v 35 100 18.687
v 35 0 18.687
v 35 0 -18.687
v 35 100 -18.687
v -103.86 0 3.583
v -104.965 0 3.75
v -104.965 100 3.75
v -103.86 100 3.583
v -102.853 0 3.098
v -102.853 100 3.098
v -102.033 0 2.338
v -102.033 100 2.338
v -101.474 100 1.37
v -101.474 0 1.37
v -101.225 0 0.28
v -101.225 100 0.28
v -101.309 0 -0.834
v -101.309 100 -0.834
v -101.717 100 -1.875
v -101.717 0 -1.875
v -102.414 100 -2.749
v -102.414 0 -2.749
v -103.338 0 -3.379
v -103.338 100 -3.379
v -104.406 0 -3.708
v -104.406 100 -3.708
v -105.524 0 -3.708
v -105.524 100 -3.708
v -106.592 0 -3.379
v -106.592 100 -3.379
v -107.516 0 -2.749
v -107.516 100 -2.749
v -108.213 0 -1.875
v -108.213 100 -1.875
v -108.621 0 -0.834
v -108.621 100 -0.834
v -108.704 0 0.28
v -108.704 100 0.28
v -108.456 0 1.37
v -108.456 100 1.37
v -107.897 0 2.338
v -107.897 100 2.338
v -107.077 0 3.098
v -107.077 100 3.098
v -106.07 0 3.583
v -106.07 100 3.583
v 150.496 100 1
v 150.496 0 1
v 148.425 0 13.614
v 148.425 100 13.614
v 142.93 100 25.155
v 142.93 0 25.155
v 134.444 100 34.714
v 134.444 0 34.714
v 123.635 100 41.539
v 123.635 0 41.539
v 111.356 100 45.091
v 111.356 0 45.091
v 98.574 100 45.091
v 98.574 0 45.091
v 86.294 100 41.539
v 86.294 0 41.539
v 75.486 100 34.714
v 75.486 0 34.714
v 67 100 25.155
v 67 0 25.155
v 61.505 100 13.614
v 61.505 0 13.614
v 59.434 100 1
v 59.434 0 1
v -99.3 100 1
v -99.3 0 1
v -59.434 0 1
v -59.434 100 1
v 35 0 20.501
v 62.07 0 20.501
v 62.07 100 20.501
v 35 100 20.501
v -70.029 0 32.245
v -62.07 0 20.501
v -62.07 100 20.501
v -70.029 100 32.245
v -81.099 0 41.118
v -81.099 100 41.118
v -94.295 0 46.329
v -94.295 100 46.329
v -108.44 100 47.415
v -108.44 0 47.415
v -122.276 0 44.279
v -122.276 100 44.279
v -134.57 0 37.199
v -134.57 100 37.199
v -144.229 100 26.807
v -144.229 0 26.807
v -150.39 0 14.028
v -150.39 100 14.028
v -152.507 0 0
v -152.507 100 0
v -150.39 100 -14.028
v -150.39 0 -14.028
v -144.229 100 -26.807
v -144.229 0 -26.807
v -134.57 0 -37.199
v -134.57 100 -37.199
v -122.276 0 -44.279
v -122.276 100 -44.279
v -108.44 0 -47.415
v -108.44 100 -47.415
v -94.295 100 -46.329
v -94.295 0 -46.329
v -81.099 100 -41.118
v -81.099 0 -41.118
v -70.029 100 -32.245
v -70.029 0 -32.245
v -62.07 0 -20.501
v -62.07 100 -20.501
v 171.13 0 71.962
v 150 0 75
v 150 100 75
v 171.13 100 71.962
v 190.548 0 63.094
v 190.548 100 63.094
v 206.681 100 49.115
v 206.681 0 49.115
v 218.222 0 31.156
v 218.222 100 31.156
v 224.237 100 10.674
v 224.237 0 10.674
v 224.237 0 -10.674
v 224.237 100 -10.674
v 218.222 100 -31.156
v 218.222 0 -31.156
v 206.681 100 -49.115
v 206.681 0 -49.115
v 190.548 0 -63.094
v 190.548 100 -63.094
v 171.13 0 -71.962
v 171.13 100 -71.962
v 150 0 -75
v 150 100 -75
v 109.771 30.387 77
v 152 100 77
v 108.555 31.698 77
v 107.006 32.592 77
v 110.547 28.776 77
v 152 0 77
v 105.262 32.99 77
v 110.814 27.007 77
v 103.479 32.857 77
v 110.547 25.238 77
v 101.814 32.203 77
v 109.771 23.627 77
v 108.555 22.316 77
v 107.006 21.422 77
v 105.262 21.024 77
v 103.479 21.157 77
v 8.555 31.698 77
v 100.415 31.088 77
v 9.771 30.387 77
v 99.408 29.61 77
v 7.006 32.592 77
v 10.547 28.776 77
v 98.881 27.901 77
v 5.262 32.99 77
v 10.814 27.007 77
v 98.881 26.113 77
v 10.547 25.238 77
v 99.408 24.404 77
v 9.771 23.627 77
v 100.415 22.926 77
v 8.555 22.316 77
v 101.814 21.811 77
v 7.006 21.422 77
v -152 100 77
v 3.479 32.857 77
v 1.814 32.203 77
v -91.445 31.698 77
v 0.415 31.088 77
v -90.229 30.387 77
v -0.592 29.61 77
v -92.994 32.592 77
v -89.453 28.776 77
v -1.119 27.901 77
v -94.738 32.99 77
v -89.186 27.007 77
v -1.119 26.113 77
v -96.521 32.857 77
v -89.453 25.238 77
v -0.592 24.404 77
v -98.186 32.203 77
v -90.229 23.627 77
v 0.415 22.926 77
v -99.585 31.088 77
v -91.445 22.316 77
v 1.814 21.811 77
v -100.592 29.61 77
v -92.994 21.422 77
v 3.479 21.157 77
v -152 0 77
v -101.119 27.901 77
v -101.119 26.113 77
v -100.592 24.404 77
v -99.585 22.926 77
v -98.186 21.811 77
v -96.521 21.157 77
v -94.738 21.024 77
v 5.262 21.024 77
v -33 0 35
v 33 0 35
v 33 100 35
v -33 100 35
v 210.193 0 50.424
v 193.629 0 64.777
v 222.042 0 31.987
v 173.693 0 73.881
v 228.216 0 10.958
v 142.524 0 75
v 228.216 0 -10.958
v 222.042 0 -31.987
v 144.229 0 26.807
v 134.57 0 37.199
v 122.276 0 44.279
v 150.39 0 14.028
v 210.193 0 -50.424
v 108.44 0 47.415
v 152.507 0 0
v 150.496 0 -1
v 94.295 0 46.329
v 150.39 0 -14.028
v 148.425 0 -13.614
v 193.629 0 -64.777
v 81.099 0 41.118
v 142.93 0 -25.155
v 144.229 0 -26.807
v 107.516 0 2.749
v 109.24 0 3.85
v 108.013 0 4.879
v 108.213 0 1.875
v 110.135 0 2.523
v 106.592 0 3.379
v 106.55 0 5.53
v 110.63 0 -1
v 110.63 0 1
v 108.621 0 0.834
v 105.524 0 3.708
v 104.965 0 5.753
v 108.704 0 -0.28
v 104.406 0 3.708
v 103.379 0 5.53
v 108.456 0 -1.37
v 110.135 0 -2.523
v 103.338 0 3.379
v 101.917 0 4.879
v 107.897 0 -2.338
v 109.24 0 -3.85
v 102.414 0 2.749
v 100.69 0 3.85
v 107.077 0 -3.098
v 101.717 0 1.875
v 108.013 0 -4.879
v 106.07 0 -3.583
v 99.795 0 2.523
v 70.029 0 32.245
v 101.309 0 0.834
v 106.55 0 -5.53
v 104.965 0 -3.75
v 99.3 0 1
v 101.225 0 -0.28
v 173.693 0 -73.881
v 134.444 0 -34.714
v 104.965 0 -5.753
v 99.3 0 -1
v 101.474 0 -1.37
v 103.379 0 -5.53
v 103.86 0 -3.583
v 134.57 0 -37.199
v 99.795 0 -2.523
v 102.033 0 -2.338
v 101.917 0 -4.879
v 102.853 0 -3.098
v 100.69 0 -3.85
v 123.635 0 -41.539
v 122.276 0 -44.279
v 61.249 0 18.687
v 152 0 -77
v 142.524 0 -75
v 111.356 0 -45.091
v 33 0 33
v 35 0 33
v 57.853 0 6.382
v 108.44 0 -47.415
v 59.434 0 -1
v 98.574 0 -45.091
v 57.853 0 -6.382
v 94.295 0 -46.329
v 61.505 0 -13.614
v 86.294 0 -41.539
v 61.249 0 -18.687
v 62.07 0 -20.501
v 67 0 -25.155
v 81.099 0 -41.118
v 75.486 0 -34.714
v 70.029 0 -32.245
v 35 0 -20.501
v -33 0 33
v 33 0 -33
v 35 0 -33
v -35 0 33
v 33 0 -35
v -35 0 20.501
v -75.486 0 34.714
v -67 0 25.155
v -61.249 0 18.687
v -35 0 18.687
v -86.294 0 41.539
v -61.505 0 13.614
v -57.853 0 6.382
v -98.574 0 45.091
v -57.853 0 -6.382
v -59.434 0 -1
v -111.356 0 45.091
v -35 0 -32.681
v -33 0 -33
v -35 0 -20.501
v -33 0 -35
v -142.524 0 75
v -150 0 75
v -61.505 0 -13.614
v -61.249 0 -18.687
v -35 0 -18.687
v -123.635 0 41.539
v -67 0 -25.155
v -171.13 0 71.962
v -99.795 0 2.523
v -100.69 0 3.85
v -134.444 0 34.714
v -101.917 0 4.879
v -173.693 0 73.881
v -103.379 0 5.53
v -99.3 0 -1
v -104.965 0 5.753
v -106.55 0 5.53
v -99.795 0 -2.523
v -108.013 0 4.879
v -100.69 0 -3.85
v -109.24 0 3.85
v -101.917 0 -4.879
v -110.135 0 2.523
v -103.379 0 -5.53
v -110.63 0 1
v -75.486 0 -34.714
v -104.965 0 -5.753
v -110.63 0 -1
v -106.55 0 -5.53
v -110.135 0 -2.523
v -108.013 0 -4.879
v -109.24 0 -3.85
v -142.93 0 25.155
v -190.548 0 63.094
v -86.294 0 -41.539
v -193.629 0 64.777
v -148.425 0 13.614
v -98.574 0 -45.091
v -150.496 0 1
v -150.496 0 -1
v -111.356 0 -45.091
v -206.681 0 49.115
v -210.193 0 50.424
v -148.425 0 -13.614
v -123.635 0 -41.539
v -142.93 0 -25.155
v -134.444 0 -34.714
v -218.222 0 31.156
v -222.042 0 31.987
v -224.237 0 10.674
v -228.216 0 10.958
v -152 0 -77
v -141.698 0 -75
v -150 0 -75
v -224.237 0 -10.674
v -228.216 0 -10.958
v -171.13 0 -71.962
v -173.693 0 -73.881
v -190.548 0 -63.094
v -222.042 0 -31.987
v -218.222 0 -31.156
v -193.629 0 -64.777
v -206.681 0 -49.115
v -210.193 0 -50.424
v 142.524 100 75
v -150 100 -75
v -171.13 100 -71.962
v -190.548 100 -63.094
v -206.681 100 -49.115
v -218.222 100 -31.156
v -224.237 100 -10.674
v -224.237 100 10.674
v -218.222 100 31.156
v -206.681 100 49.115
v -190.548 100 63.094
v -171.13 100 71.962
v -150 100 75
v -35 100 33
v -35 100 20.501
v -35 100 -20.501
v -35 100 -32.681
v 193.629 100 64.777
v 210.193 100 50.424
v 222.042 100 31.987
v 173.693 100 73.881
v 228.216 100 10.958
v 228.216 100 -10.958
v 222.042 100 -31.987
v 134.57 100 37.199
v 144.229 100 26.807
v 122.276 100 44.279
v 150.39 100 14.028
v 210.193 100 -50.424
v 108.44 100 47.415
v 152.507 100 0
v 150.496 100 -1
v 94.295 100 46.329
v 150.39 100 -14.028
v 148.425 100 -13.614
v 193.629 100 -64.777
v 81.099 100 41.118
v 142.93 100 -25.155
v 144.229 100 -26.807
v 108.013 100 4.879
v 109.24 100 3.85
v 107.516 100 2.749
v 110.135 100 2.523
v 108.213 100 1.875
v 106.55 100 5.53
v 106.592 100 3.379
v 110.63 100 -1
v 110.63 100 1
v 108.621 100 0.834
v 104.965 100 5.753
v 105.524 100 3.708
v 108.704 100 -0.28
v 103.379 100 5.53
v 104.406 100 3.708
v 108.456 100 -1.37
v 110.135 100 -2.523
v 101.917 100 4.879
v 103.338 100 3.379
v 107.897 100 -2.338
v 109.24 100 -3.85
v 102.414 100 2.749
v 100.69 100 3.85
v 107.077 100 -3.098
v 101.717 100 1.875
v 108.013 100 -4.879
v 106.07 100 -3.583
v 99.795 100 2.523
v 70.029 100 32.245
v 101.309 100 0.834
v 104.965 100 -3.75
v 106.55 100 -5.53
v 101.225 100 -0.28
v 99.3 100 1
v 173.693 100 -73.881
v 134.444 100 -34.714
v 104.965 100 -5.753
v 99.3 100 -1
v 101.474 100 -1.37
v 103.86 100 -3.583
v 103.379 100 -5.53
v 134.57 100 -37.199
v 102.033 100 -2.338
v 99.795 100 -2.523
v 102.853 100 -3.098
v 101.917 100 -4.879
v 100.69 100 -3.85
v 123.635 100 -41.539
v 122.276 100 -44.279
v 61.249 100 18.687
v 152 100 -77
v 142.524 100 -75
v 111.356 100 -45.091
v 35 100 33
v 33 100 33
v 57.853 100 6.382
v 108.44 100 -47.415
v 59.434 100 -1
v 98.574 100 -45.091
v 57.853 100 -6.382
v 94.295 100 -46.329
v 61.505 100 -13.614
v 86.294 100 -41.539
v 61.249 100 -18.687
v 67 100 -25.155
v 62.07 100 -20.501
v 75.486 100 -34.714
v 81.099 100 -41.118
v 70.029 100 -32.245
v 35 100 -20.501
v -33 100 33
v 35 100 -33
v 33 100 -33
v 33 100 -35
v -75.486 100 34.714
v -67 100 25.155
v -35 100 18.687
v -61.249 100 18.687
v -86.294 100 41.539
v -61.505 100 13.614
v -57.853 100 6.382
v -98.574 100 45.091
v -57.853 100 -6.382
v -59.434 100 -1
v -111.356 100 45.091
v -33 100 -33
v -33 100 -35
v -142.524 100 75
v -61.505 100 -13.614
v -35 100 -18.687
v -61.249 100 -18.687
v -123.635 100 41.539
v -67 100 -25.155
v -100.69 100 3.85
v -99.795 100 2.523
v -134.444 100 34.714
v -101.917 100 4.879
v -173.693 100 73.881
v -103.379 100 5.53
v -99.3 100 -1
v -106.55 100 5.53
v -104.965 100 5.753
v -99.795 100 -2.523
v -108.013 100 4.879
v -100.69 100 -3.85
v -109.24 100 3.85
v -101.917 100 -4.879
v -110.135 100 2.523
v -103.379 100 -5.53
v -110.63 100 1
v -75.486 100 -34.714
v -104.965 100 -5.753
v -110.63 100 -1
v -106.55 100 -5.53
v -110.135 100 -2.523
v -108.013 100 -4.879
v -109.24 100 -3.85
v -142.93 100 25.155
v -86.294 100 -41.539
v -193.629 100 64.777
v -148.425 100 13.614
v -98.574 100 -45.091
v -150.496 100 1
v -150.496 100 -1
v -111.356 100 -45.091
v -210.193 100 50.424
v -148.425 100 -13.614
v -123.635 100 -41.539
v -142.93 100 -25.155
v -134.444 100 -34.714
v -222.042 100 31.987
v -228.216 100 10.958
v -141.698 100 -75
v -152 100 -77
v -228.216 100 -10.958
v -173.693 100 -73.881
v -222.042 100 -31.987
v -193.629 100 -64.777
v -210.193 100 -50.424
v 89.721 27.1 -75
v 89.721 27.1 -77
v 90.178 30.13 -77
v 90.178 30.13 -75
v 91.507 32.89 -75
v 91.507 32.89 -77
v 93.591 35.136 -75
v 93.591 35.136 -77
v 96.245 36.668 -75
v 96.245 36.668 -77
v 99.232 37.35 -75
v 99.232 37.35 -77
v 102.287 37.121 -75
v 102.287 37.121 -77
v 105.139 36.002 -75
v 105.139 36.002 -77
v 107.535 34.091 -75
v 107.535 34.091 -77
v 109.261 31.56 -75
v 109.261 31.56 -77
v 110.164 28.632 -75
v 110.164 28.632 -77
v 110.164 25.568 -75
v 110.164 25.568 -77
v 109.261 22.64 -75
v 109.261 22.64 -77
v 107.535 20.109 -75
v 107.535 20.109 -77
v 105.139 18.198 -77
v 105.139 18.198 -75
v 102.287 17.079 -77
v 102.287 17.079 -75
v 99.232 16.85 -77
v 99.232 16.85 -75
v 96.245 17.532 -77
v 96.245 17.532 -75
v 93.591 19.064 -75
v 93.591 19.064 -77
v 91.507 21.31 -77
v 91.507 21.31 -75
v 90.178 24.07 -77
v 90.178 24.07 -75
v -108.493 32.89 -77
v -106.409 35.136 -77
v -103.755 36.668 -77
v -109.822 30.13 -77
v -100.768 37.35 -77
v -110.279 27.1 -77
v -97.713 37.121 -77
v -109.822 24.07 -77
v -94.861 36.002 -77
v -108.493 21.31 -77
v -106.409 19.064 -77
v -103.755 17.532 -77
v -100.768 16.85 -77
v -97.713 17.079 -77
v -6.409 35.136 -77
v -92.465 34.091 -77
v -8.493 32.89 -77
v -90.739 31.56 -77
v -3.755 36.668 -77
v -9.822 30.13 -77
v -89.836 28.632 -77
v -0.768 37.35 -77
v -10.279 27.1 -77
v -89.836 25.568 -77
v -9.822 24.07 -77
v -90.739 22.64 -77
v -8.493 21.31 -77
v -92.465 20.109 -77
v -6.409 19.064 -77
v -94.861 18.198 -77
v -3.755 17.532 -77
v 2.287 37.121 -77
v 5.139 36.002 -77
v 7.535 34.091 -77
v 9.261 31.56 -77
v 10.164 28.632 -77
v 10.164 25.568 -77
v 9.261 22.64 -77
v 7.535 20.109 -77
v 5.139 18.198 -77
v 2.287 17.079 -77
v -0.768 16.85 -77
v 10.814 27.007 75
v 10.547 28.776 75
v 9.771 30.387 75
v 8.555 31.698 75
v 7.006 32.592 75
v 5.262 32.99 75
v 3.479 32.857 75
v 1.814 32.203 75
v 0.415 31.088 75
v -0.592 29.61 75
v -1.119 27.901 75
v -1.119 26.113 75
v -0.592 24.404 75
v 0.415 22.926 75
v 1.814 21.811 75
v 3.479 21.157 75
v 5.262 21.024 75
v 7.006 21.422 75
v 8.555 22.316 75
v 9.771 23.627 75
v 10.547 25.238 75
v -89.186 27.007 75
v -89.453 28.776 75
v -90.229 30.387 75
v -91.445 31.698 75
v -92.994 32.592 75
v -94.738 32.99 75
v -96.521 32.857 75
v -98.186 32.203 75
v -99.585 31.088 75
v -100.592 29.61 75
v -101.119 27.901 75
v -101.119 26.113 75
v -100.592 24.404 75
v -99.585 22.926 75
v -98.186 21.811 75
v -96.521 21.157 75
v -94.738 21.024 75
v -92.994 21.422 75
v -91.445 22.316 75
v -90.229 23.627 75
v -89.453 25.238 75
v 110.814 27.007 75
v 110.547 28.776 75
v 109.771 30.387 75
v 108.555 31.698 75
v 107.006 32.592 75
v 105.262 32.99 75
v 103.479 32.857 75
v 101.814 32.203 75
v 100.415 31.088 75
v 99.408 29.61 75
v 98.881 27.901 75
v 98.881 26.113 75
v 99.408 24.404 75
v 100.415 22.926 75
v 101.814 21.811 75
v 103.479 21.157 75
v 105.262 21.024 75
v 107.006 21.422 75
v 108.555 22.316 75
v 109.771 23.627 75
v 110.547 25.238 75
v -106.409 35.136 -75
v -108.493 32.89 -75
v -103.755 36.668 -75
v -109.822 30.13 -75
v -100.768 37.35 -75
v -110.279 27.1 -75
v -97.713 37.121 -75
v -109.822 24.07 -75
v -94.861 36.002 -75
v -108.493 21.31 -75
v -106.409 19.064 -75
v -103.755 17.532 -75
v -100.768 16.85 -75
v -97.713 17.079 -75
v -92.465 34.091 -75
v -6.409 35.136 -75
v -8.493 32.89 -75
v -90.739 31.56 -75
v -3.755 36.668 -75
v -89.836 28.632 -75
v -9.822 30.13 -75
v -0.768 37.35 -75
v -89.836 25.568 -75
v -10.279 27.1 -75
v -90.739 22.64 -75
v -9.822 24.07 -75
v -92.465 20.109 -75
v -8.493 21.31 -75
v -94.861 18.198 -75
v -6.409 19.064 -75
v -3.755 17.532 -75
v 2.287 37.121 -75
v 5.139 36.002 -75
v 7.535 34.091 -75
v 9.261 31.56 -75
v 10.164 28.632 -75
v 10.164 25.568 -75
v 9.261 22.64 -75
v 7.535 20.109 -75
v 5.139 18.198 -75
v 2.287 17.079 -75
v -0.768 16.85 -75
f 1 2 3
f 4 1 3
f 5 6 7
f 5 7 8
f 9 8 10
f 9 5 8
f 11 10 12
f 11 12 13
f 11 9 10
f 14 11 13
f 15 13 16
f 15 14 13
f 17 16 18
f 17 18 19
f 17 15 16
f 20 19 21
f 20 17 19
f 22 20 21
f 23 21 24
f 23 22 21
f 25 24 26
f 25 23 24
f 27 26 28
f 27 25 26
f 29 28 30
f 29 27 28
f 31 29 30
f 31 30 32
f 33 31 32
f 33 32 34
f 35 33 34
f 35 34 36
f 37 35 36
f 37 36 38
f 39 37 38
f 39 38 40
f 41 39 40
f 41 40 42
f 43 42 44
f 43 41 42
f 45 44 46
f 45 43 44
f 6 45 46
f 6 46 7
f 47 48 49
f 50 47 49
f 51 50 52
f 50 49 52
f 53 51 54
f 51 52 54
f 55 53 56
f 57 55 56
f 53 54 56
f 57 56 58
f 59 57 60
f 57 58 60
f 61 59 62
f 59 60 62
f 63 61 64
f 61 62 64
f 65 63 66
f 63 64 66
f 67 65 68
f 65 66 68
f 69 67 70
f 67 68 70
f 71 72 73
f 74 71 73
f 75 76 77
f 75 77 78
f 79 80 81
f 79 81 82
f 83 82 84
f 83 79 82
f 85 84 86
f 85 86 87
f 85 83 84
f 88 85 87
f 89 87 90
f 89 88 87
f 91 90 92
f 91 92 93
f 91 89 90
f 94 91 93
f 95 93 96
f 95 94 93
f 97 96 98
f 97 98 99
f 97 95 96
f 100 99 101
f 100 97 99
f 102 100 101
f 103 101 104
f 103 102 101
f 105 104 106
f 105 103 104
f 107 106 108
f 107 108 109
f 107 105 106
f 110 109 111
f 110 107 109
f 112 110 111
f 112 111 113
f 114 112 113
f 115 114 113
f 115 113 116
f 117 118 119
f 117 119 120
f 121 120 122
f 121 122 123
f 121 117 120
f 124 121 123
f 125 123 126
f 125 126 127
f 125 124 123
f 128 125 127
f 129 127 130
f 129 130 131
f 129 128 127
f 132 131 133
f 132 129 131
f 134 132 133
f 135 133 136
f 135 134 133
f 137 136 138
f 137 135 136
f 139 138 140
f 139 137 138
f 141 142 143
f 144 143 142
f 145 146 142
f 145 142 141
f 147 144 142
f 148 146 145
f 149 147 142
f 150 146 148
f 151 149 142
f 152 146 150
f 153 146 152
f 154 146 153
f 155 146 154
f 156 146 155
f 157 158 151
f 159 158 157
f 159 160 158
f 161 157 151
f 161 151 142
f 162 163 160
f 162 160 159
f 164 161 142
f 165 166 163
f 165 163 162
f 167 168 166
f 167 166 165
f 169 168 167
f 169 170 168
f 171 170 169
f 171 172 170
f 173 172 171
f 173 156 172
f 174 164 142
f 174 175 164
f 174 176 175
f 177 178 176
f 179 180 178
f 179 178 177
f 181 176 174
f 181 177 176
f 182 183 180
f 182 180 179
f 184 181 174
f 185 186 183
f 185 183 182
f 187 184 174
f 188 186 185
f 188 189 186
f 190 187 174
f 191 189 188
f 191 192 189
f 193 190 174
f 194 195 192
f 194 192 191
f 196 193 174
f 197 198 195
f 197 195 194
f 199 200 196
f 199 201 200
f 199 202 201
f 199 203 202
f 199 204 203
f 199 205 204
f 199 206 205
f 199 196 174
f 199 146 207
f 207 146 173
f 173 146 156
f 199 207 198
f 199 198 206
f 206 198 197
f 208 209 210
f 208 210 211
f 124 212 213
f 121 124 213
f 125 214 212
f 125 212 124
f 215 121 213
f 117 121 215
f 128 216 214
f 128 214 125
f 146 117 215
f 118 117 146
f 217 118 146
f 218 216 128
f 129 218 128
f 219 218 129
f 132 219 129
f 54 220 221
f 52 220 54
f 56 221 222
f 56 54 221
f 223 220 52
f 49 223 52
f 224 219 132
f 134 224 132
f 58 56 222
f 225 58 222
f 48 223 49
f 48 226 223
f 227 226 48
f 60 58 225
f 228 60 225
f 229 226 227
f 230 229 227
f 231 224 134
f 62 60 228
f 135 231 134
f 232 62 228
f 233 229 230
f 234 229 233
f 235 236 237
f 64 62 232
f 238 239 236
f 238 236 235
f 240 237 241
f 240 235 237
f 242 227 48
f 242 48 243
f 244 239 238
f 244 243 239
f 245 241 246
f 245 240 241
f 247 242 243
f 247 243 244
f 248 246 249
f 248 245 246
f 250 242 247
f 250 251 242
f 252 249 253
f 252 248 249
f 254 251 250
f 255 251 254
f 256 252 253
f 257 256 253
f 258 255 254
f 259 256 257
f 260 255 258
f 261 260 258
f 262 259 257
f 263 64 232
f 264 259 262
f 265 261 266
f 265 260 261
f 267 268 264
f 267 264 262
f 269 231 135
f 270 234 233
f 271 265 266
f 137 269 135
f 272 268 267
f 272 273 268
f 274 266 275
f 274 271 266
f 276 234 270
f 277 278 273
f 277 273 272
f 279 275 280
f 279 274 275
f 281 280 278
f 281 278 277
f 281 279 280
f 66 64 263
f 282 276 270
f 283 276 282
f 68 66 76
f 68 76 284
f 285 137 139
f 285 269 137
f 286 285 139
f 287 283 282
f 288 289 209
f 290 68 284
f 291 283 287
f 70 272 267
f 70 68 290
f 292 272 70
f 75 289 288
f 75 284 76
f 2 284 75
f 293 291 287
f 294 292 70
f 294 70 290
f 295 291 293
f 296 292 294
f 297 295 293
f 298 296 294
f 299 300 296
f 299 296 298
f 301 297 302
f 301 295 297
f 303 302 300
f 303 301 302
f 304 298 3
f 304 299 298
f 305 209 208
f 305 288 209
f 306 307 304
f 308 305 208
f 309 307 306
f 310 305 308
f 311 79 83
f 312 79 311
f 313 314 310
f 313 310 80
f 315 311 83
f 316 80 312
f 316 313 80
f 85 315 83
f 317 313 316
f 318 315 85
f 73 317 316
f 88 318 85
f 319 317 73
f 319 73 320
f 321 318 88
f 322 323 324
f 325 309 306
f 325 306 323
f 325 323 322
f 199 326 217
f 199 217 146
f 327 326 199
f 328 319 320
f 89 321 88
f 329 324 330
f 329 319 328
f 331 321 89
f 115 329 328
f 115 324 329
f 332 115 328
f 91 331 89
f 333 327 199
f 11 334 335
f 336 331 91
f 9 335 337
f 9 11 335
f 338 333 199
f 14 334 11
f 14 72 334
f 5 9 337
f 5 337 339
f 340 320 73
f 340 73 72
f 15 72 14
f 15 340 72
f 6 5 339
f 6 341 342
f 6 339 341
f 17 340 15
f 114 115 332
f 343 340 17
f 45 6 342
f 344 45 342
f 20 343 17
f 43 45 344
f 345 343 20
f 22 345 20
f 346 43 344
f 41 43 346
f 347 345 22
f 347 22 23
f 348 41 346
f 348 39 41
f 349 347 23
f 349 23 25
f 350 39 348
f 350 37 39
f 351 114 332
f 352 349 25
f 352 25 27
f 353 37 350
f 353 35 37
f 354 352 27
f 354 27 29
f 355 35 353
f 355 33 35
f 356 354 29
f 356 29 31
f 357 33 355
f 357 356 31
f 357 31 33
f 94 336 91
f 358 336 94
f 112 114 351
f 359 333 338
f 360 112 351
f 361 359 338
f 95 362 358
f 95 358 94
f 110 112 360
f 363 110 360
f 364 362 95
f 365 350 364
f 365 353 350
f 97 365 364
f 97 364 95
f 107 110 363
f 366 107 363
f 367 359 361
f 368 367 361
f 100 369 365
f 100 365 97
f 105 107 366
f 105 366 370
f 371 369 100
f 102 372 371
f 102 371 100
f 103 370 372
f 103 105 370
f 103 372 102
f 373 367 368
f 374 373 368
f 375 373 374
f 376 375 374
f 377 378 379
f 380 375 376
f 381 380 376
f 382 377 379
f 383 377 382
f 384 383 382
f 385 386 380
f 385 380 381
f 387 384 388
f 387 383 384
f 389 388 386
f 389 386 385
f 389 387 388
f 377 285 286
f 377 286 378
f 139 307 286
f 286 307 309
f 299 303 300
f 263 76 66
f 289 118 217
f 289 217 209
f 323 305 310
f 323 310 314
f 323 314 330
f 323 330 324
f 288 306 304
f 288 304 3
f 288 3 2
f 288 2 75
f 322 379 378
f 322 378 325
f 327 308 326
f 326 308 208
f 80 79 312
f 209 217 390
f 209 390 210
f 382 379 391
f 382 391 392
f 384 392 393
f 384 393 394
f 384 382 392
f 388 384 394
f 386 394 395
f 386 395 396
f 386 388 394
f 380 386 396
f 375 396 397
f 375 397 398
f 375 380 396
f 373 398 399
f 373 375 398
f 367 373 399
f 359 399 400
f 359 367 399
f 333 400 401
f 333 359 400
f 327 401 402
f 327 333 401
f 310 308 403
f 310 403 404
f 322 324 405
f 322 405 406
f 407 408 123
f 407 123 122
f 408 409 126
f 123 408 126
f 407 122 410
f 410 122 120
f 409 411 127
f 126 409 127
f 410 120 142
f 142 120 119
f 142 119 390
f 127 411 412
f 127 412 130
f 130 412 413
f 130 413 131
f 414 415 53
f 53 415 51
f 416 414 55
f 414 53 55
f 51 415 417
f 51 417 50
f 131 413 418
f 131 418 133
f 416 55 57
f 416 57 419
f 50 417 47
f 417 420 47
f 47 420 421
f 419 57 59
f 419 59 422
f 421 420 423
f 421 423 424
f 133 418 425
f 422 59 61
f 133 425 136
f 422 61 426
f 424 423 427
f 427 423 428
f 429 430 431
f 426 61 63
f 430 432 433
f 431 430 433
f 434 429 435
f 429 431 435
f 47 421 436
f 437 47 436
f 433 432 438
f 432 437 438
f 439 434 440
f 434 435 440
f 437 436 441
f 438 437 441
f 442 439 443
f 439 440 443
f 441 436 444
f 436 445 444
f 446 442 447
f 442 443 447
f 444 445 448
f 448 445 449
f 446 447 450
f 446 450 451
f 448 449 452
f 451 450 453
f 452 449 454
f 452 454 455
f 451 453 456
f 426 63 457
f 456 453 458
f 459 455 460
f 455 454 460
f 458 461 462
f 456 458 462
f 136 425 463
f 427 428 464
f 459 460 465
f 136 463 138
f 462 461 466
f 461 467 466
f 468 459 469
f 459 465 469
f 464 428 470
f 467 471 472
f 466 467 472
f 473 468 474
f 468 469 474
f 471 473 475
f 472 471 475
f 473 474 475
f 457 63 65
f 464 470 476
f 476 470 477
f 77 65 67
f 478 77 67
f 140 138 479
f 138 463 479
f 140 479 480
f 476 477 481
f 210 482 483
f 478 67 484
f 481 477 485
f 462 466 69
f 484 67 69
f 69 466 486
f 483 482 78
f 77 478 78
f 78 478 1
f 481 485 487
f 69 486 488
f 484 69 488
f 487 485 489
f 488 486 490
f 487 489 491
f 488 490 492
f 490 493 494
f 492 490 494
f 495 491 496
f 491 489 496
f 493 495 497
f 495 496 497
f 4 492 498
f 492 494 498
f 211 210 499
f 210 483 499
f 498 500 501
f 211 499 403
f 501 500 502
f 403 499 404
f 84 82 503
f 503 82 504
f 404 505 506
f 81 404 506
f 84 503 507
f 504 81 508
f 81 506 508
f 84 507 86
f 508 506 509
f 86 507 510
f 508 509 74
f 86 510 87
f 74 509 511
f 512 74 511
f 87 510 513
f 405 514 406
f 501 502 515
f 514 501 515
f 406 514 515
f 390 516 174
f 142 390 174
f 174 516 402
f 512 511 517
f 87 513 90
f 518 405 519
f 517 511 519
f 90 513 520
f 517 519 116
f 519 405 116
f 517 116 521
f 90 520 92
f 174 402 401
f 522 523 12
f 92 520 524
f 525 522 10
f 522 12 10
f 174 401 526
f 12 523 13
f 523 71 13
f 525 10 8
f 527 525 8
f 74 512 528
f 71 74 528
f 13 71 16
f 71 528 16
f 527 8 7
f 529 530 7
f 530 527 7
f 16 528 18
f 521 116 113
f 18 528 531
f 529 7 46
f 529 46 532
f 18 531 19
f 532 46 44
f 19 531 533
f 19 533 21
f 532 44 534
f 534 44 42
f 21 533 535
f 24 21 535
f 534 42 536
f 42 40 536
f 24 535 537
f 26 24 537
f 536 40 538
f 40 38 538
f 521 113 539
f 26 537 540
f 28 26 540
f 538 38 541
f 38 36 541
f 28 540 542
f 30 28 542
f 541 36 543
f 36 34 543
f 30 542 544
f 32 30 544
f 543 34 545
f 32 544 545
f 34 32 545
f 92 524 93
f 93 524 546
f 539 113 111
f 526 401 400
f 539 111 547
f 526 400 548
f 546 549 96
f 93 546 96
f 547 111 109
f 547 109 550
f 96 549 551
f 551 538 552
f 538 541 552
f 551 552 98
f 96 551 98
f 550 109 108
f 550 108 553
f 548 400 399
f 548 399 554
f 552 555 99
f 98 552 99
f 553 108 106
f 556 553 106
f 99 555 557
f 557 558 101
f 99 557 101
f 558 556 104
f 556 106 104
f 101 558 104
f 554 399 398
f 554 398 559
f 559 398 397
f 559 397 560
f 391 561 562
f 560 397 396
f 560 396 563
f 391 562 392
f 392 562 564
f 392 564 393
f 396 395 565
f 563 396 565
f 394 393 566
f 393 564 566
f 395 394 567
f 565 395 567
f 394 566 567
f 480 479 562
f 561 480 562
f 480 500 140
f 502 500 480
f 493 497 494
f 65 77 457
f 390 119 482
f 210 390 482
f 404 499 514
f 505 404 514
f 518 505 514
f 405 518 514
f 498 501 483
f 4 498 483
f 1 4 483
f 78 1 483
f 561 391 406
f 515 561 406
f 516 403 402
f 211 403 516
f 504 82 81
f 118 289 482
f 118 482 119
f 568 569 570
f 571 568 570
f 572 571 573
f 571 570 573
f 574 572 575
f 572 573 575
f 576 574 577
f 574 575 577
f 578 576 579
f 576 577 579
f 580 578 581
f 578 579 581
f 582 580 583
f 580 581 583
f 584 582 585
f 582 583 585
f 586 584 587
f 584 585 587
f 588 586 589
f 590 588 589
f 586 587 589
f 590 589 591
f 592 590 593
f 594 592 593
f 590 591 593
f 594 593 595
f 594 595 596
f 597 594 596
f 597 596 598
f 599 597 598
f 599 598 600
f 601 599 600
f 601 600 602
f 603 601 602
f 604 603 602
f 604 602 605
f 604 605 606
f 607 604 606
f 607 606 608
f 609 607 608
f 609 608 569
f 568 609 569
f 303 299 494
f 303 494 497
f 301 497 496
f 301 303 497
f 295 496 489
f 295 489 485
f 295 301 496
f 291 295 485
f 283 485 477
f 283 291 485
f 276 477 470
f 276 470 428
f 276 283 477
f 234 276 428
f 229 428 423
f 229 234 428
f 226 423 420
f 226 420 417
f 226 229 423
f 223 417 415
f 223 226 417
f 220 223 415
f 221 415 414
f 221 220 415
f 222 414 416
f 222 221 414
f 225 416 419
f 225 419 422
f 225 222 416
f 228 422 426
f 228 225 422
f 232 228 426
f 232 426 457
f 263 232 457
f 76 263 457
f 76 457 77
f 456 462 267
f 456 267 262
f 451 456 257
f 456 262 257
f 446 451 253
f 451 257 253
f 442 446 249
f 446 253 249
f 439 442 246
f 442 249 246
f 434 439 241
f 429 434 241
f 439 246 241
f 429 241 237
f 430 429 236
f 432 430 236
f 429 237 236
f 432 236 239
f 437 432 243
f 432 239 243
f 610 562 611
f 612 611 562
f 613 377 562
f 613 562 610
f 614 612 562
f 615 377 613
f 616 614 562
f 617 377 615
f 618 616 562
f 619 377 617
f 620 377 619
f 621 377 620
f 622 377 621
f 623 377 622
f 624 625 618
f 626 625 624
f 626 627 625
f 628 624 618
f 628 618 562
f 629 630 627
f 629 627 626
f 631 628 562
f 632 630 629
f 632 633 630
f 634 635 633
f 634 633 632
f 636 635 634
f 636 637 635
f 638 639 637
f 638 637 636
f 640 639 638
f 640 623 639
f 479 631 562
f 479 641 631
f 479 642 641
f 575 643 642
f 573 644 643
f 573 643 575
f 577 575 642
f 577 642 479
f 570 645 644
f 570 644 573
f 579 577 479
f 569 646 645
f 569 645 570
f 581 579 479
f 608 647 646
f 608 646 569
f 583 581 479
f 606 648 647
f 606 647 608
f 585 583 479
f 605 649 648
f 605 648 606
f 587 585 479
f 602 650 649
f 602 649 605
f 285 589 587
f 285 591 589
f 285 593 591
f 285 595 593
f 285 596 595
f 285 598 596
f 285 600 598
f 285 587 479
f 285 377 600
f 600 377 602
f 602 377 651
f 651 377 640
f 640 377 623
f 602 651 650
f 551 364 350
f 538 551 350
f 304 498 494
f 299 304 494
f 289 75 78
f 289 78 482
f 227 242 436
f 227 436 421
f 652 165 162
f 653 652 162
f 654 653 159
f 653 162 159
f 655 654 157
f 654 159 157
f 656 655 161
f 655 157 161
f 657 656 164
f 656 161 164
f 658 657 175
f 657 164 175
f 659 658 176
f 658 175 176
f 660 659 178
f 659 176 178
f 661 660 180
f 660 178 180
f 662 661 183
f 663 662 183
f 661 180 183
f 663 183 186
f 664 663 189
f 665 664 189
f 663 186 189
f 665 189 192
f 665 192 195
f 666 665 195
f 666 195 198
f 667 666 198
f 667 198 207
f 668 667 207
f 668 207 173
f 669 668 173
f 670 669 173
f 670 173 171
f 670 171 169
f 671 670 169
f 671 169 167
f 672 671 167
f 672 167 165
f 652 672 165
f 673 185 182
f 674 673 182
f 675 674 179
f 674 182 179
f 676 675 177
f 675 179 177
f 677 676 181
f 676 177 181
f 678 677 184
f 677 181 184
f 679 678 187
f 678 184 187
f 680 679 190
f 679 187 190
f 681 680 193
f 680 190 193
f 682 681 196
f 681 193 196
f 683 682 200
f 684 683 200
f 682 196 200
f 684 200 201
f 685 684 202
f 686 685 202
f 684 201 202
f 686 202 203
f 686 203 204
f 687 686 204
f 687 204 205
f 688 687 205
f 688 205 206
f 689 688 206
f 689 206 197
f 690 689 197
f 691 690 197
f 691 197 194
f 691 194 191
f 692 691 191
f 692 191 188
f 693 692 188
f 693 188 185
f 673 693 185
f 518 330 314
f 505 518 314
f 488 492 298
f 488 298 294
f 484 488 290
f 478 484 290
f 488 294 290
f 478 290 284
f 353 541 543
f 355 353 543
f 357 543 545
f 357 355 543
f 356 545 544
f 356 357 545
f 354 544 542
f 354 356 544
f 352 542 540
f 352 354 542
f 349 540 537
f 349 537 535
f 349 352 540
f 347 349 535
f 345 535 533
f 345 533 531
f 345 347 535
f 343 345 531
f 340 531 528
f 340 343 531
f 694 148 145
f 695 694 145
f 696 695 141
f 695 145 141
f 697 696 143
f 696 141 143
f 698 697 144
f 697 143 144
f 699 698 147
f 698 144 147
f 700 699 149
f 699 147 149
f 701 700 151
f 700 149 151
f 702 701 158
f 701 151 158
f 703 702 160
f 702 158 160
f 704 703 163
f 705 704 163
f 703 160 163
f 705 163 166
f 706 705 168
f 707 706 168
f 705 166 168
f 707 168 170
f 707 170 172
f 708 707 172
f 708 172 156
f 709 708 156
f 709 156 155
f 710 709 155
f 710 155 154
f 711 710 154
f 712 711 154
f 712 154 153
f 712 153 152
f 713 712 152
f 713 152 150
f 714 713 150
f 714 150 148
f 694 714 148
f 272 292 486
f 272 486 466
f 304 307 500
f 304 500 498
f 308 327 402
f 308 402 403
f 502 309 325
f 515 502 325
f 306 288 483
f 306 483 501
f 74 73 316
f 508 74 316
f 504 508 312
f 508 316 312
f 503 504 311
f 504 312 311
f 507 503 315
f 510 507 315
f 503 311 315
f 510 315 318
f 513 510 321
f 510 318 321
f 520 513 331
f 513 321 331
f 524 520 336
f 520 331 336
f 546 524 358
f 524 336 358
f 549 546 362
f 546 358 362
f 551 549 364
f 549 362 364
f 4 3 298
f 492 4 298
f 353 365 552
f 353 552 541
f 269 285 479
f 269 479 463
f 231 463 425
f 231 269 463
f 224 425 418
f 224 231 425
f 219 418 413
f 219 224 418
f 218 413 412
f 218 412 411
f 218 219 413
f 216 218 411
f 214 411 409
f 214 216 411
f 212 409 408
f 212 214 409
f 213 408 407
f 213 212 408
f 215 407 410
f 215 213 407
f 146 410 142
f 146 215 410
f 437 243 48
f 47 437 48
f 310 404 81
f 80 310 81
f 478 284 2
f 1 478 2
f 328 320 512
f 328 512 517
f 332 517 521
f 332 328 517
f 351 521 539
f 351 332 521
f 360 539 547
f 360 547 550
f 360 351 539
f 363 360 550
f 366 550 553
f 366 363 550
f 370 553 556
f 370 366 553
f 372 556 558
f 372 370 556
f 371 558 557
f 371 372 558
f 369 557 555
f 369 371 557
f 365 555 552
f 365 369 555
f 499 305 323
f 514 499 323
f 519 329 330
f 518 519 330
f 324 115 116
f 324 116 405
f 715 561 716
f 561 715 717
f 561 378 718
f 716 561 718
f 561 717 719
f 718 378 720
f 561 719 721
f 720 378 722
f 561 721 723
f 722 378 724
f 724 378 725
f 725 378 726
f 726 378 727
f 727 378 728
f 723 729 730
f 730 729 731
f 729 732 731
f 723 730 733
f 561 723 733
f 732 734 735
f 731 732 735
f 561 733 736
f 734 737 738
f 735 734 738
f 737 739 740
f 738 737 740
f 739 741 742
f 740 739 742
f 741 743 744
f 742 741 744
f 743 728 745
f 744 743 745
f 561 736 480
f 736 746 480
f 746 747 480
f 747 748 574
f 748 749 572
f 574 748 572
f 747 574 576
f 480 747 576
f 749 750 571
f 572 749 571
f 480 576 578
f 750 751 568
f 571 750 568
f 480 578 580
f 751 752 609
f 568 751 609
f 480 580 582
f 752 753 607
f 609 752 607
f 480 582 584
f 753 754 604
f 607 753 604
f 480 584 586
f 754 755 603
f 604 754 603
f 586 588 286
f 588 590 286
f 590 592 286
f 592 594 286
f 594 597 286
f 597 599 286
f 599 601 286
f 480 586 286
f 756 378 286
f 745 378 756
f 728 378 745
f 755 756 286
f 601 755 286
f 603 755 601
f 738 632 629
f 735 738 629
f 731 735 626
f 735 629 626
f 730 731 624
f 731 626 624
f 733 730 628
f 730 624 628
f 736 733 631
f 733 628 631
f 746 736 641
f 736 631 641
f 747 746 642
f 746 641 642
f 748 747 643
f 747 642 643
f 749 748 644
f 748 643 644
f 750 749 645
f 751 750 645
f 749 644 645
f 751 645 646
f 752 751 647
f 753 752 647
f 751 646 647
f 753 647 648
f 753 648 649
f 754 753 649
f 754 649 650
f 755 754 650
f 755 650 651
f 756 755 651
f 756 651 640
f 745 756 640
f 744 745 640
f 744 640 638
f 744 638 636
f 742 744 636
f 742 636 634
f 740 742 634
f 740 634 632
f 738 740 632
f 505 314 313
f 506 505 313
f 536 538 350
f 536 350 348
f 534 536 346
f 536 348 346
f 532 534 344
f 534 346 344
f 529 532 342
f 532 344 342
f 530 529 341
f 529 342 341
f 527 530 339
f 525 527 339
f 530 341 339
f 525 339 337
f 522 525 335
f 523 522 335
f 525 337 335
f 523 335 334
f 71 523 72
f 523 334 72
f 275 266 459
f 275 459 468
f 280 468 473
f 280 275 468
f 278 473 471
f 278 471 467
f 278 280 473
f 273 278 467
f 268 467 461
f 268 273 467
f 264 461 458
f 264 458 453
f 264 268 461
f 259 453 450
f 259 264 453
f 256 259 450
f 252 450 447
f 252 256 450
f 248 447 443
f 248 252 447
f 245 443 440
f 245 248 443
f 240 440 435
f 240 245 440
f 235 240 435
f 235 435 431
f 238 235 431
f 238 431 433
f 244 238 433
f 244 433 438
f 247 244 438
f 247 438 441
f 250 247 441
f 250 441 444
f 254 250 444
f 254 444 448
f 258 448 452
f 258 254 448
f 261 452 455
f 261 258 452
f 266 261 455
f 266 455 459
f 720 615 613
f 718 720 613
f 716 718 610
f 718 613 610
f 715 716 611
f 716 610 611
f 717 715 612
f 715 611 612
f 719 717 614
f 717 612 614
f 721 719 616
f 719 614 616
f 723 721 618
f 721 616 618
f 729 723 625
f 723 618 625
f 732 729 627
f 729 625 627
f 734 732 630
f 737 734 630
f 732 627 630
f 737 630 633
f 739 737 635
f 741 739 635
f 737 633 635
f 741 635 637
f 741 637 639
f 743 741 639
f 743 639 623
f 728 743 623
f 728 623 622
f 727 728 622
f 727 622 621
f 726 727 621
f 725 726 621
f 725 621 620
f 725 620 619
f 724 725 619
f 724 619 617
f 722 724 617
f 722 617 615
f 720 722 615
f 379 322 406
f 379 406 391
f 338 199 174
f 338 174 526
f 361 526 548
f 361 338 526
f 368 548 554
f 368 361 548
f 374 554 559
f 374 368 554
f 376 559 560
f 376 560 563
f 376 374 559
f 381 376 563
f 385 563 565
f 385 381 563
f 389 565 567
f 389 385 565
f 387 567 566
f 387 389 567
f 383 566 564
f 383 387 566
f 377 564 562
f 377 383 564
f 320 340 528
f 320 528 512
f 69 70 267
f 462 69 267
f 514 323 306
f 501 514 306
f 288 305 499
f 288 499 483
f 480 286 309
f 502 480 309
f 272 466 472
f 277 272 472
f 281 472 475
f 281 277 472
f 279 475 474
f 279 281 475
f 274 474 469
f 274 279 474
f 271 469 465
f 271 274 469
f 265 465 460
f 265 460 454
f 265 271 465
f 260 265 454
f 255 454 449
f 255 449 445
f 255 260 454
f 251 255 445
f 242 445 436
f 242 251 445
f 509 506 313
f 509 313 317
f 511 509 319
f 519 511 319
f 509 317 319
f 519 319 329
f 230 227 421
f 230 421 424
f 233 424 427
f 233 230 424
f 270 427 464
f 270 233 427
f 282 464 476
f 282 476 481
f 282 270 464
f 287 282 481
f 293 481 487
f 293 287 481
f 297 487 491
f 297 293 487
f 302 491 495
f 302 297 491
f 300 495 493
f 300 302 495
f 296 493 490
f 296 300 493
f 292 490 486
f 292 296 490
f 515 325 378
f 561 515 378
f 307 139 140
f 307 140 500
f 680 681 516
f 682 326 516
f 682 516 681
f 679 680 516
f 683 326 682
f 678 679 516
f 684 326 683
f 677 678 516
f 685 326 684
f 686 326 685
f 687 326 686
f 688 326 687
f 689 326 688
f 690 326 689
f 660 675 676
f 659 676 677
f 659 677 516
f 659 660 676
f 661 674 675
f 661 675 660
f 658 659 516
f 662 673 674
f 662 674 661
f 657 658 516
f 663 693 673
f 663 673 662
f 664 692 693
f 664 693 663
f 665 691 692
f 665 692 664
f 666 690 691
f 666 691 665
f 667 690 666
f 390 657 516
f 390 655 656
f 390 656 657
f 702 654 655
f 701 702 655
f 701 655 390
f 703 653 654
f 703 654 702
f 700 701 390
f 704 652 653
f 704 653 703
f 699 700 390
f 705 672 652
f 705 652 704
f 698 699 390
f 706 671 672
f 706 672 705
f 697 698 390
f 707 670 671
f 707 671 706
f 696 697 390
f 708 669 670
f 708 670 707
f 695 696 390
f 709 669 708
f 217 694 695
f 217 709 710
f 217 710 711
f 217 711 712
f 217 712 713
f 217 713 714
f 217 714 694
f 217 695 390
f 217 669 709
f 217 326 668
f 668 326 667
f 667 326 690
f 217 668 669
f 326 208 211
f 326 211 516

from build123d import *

# Parameters (mm, degrees)
SKETCH1_R           = 3.75
SKETCH1_W           = 66
SKETCH1_H           = 66
BOSS_EXTRUDE1_DEPTH = 100
SKETCH2_R           = 6
CUT_EXTRUDE1_DEPTH  = 10
SKETCH4_R           = 10.278687008
CUT_EXTRUDE2_DEPTH  = 10


with BuildPart() as part:
    # Sketch1 → Boss-Extrude1 (new body)
    with BuildSketch(Plane(origin=(0, 0, 0), x_dir=(1, 0, 0), z_dir=(0, 1, 0))):
        with BuildLine():
            Line((-152, 77), (152, 77))
            ThreePointArc((152, 77), (229, 0), (152, -77))
            Line((152, -77), (-152, -77))
            ThreePointArc((-152, -77), (-229, 0), (-152, 77))
        make_face()
        with Locations(Location((-104.964953983, 0, 0), (0, 0, 270))):
            Circle(SKETCH1_R, mode=Mode.SUBTRACT)
        with Locations(Location((104.964953983, 0, 0), (0, 0, 90))):
            Circle(SKETCH1_R, mode=Mode.SUBTRACT)
        Polygon((-141.697585802, 75), (142.523809524, 75), (33, 35), (-33, 35), align=None, mode=Mode.SUBTRACT)
        Polygon((-142.523809524, -75), (142.523809524, -75), (33, -35), (-33, -35), align=None, mode=Mode.SUBTRACT)
        with BuildLine():
            Line((-35, 32.680752833), (-150, 75))
            ThreePointArc((-150, 75), (-225, 0), (-150, -75))
            Line((-150, -75), (-35, -33))
            Line((-35, -33), (-35, -20.501152441))
            Line((-35, -20.501152441), (-62.070194122, -20.501152441))
            ThreePointArc((-62.070194122, -20.501152441), (-152.507121318, 0), (-62.070194122, 20.501152441))
            Line((-62.070194122, 20.501152441), (-35, 20.501152441))
            Line((-35, 20.501152441), (-35, 32.680752833))
        make_face(mode=Mode.SUBTRACT)
        with BuildLine():
            Line((35, 33), (35, 20.501152441))
            Line((35, 20.501152441), (62.070194122, 20.501152441))
            ThreePointArc((62.070194122, 20.501152441), (152.507121318, 0), (62.070194122, -20.501152441))
            Line((62.070194122, -20.501152441), (35, -20.501152441))
            Line((35, -20.501152441), (35, -33))
            Line((35, -33), (150, -75))
            ThreePointArc((150, -75), (225, 0), (150, 75))
            Line((150, 75), (35, 33))
        make_face(mode=Mode.SUBTRACT)
        Rectangle(SKETCH1_W, SKETCH1_H, mode=Mode.SUBTRACT)
        with BuildLine():
            Line((-61.249343804, 18.686976792), (-35, 18.686976792))
            Line((-35, 18.686976792), (-35, -18.686976792))
            Line((-35, -18.686976792), (-61.249343804, -18.686976792))
            ThreePointArc((-61.249343804, -18.686976792), (-57.422786648, 0), (-61.249343804, 18.686976792))
        make_face(mode=Mode.SUBTRACT)
        with BuildLine():
            Line((61.249343804, -18.686976792), (35, -18.686976792))
            Line((35, -18.686976792), (35, 18.686976792))
            Line((35, 18.686976792), (61.249343804, 18.686976792))
            ThreePointArc((61.249343804, 18.686976792), (57.422786648, 0), (61.249343804, -18.686976792))
        make_face(mode=Mode.SUBTRACT)
        with BuildLine():
            Line((-150.496141158, 1), (-110.630261894, 1))
            ThreePointArc((-110.630261894, 1), (-104.964953983, 5.752887425), (-99.299646072, 1))
            Line((-99.299646072, 1), (-59.433766808, 1))
            ThreePointArc((-59.433766808, 1), (-104.964953983, 45.542167335), (-150.496141158, 1))
        make_face(mode=Mode.SUBTRACT)
        with BuildLine():
            Line((-150.496141158, -1), (-110.630261894, -1))
            ThreePointArc((-110.630261894, -1), (-104.964953983, -5.752887425), (-99.299646072, -1))
            Line((-99.299646072, -1), (-59.433766808, -1))
            ThreePointArc((-59.433766808, -1), (-104.964953983, -45.542167335), (-150.496141158, -1))
        make_face(mode=Mode.SUBTRACT)
        with BuildLine():
            Line((59.433766808, 1), (99.299646072, 1))
            ThreePointArc((99.299646072, 1), (104.964953983, 5.752887425), (110.630261894, 1))
            Line((110.630261894, 1), (150.496141158, 1))
            ThreePointArc((150.496141158, 1), (104.964953983, 45.542167335), (59.433766808, 1))
        make_face(mode=Mode.SUBTRACT)
        with BuildLine():
            Line((59.433766808, -1), (99.299646072, -1))
            ThreePointArc((99.299646072, -1), (104.964953983, -5.752887425), (110.630261894, -1))
            Line((110.630261894, -1), (150.496141158, -1))
            ThreePointArc((150.496141158, -1), (104.964953983, -45.542167335), (59.433766808, -1))
        make_face(mode=Mode.SUBTRACT)
    extrude(amount=BOSS_EXTRUDE1_DEPTH)

    # Sketch2 → Cut-Extrude1 (cut)
    with BuildSketch(Plane.XY.offset(77)):
        with Locations((4.813758286, 27.006971007)):
            Circle(SKETCH2_R)
        with Locations((104.813758286, 27.006971007)):
            Circle(SKETCH2_R)
        with Locations((-95.186241714, 27.006971007)):
            Circle(SKETCH2_R)
    extrude(amount=-CUT_EXTRUDE1_DEPTH, mode=Mode.SUBTRACT)

    # Sketch4 → Cut-Extrude2 (cut)
    with BuildSketch(Plane(origin=(0, 0, -77), x_dir=(-1, 0, 0), z_dir=(0, 0, -1))):
        with Locations((0, 27.1)):
            Circle(SKETCH4_R)
        with Locations((100, 27.1)):
            Circle(SKETCH4_R)
        with Locations((-100, 27.1)):
            Circle(SKETCH4_R)
    extrude(amount=-CUT_EXTRUDE2_DEPTH, mode=Mode.SUBTRACT)


solid = part.part
